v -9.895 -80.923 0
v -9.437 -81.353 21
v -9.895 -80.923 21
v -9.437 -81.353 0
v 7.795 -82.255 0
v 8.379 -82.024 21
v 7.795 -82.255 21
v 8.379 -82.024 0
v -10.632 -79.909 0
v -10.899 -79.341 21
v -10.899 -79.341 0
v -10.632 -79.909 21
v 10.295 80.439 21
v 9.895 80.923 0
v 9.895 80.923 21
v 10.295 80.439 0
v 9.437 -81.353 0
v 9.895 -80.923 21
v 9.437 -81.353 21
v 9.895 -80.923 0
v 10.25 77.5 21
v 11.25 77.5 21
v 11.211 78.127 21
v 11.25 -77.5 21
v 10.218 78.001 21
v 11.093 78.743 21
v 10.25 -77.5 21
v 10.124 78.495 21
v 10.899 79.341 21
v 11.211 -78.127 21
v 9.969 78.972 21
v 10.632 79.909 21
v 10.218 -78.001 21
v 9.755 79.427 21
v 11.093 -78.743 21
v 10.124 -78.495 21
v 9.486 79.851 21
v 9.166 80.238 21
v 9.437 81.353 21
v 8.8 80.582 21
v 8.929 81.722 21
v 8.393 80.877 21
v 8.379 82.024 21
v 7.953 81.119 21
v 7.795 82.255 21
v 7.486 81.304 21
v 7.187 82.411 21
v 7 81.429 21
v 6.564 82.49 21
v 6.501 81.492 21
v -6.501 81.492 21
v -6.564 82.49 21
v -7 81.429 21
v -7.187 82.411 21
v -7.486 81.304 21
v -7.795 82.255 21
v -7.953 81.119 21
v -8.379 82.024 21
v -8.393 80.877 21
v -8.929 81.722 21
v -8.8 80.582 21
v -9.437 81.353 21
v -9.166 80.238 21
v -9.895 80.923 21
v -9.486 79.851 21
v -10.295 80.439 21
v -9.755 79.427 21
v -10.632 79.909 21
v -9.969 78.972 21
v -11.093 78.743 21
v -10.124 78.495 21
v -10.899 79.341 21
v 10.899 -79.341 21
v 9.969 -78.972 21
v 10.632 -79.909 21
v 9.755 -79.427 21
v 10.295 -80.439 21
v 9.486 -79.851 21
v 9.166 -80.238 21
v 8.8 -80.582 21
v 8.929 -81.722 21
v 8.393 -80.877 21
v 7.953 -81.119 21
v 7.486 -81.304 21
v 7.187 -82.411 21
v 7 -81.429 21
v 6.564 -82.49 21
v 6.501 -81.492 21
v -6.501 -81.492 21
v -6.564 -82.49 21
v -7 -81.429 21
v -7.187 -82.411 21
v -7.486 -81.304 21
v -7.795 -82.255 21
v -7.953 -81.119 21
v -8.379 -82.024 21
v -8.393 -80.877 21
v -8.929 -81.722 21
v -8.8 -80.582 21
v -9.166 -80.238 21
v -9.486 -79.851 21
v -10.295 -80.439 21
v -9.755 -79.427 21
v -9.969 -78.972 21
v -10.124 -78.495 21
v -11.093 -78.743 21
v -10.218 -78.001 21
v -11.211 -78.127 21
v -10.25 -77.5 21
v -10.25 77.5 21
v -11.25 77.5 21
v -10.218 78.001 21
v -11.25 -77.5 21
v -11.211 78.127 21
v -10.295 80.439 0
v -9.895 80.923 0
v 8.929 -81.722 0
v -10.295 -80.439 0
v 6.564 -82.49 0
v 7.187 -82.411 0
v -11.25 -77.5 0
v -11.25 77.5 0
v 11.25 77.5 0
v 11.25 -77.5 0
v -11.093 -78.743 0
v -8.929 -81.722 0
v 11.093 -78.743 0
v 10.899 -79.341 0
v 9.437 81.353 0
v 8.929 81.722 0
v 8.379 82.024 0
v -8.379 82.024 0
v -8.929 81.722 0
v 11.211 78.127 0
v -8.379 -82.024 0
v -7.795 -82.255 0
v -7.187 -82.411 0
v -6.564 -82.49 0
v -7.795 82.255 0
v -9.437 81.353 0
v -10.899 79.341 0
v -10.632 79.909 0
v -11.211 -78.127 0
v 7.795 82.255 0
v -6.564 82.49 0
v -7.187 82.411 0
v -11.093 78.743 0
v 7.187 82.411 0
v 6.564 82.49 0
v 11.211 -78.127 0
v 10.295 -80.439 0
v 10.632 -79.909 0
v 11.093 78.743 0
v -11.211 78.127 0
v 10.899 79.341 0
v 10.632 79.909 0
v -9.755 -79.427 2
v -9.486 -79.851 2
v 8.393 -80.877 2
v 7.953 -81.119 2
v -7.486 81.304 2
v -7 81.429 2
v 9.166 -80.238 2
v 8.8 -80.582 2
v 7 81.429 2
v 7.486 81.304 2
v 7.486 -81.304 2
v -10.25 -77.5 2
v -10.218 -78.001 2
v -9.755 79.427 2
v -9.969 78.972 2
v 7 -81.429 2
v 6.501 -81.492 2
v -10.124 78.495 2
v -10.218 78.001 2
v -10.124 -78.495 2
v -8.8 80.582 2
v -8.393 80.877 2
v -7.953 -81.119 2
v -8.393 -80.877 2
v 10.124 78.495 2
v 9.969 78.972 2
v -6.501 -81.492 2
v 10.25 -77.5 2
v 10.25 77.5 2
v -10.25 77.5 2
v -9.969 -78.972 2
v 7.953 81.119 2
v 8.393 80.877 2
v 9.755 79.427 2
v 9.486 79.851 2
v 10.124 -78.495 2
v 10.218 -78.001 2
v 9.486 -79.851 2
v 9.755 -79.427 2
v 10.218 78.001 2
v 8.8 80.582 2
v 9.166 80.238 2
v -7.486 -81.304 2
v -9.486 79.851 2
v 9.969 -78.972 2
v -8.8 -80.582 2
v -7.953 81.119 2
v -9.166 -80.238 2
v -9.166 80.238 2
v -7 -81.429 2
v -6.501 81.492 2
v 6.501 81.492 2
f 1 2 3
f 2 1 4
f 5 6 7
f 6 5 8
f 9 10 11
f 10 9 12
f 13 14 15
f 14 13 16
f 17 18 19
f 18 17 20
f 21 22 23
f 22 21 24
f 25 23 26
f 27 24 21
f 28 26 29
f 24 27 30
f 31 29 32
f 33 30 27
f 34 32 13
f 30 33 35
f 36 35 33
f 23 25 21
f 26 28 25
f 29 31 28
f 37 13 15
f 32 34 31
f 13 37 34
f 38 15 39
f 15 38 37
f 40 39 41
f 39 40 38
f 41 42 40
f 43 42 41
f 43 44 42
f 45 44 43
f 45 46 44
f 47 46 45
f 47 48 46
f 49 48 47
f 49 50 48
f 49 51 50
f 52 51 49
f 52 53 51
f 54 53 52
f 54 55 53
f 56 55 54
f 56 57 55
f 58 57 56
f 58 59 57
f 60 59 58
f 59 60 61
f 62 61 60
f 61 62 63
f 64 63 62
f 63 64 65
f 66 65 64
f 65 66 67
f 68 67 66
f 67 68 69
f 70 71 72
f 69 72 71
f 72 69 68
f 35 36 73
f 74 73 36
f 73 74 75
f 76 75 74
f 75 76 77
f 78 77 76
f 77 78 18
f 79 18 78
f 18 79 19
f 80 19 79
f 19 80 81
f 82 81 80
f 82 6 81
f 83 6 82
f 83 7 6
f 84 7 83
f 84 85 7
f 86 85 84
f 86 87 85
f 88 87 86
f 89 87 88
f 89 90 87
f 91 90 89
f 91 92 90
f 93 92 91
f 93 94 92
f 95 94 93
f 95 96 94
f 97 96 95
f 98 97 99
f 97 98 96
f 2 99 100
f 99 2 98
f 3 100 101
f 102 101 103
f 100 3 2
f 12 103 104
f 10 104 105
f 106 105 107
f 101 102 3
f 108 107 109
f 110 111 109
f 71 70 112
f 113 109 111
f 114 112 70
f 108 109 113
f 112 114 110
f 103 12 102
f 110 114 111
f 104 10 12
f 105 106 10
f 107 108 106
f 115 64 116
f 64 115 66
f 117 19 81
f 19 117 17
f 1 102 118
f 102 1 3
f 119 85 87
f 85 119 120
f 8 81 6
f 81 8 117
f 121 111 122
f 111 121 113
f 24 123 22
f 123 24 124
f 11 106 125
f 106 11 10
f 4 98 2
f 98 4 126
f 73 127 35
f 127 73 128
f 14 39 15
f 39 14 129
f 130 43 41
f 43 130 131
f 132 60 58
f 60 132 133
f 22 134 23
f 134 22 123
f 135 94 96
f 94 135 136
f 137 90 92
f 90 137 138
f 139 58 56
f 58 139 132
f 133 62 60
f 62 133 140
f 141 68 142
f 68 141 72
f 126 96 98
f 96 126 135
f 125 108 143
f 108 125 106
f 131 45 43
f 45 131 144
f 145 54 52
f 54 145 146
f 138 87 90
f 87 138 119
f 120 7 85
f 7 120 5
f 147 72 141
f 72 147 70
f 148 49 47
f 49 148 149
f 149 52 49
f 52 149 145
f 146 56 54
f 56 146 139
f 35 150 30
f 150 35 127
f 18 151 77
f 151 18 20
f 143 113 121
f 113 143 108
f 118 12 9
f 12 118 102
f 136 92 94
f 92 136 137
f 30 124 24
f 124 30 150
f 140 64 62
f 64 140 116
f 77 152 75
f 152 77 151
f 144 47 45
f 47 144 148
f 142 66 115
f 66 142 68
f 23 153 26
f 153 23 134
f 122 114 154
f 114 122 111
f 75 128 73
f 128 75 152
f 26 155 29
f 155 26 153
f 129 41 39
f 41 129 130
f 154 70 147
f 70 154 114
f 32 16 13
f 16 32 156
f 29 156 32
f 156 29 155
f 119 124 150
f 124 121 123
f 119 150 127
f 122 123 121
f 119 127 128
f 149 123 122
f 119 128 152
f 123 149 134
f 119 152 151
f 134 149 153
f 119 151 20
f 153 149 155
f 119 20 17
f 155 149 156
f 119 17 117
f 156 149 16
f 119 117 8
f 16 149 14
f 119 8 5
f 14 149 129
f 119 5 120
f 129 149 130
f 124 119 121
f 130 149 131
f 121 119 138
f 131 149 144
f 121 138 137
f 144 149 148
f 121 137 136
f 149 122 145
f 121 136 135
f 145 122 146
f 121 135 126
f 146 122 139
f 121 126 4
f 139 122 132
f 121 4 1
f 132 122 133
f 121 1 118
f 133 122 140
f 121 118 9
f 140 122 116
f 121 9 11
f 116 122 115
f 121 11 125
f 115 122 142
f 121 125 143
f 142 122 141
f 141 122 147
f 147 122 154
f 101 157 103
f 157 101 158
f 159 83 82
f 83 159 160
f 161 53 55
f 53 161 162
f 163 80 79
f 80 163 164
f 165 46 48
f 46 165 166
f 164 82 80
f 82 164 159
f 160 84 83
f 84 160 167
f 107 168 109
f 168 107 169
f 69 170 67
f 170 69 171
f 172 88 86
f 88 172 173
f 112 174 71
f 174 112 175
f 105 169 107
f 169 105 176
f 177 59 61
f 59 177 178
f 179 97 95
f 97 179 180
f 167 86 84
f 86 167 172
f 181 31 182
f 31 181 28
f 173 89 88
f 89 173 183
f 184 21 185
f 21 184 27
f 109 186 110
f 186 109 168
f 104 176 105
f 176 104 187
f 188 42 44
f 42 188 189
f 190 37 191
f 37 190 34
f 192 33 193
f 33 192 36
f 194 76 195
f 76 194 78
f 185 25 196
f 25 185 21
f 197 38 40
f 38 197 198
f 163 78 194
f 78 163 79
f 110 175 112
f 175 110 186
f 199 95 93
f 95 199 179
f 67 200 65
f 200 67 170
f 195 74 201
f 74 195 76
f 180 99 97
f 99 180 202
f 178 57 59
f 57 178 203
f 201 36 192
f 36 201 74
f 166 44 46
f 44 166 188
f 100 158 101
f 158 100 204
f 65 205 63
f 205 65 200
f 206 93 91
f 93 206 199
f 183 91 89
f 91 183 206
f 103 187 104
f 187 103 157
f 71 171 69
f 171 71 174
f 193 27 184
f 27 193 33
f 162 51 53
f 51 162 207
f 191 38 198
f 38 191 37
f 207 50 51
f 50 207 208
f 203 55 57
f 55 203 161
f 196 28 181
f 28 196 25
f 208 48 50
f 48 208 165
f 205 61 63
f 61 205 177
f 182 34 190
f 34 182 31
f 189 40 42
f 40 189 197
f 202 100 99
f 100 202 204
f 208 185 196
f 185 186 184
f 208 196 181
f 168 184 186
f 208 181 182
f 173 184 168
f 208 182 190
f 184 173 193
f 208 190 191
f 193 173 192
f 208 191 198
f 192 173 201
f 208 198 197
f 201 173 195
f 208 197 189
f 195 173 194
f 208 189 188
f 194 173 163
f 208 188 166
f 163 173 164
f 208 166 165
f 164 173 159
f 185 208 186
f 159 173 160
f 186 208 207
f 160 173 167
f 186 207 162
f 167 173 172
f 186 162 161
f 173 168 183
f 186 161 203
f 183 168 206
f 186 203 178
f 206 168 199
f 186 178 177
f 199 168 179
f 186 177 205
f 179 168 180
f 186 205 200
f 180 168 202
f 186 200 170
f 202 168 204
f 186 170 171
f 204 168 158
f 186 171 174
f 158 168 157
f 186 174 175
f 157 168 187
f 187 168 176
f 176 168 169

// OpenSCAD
$fn = 50;


difference() {
	union() {
		hull() {
			translate(v = [-6.2500000000, 77.5000000000, 0]) {
				cylinder(h = 21, r = 5);
			}
			translate(v = [6.2500000000, 77.5000000000, 0]) {
				cylinder(h = 21, r = 5);
			}
			translate(v = [-6.2500000000, -77.5000000000, 0]) {
				cylinder(h = 21, r = 5);
			}
			translate(v = [6.2500000000, -77.5000000000, 0]) {
				cylinder(h = 21, r = 5);
			}
		}
	}
	union() {
		translate(v = [0, 0, 2]) {
			hull() {
				translate(v = [-6.2500000000, 77.5000000000, 0]) {
					cylinder(h = 19, r = 4);
				}
				translate(v = [6.2500000000, 77.5000000000, 0]) {
					cylinder(h = 19, r = 4);
				}
				translate(v = [-6.2500000000, -77.5000000000, 0]) {
					cylinder(h = 19, r = 4);
				}
				translate(v = [6.2500000000, -77.5000000000, 0]) {
					cylinder(h = 19, r = 4);
				}
			}
		}
	}
}
